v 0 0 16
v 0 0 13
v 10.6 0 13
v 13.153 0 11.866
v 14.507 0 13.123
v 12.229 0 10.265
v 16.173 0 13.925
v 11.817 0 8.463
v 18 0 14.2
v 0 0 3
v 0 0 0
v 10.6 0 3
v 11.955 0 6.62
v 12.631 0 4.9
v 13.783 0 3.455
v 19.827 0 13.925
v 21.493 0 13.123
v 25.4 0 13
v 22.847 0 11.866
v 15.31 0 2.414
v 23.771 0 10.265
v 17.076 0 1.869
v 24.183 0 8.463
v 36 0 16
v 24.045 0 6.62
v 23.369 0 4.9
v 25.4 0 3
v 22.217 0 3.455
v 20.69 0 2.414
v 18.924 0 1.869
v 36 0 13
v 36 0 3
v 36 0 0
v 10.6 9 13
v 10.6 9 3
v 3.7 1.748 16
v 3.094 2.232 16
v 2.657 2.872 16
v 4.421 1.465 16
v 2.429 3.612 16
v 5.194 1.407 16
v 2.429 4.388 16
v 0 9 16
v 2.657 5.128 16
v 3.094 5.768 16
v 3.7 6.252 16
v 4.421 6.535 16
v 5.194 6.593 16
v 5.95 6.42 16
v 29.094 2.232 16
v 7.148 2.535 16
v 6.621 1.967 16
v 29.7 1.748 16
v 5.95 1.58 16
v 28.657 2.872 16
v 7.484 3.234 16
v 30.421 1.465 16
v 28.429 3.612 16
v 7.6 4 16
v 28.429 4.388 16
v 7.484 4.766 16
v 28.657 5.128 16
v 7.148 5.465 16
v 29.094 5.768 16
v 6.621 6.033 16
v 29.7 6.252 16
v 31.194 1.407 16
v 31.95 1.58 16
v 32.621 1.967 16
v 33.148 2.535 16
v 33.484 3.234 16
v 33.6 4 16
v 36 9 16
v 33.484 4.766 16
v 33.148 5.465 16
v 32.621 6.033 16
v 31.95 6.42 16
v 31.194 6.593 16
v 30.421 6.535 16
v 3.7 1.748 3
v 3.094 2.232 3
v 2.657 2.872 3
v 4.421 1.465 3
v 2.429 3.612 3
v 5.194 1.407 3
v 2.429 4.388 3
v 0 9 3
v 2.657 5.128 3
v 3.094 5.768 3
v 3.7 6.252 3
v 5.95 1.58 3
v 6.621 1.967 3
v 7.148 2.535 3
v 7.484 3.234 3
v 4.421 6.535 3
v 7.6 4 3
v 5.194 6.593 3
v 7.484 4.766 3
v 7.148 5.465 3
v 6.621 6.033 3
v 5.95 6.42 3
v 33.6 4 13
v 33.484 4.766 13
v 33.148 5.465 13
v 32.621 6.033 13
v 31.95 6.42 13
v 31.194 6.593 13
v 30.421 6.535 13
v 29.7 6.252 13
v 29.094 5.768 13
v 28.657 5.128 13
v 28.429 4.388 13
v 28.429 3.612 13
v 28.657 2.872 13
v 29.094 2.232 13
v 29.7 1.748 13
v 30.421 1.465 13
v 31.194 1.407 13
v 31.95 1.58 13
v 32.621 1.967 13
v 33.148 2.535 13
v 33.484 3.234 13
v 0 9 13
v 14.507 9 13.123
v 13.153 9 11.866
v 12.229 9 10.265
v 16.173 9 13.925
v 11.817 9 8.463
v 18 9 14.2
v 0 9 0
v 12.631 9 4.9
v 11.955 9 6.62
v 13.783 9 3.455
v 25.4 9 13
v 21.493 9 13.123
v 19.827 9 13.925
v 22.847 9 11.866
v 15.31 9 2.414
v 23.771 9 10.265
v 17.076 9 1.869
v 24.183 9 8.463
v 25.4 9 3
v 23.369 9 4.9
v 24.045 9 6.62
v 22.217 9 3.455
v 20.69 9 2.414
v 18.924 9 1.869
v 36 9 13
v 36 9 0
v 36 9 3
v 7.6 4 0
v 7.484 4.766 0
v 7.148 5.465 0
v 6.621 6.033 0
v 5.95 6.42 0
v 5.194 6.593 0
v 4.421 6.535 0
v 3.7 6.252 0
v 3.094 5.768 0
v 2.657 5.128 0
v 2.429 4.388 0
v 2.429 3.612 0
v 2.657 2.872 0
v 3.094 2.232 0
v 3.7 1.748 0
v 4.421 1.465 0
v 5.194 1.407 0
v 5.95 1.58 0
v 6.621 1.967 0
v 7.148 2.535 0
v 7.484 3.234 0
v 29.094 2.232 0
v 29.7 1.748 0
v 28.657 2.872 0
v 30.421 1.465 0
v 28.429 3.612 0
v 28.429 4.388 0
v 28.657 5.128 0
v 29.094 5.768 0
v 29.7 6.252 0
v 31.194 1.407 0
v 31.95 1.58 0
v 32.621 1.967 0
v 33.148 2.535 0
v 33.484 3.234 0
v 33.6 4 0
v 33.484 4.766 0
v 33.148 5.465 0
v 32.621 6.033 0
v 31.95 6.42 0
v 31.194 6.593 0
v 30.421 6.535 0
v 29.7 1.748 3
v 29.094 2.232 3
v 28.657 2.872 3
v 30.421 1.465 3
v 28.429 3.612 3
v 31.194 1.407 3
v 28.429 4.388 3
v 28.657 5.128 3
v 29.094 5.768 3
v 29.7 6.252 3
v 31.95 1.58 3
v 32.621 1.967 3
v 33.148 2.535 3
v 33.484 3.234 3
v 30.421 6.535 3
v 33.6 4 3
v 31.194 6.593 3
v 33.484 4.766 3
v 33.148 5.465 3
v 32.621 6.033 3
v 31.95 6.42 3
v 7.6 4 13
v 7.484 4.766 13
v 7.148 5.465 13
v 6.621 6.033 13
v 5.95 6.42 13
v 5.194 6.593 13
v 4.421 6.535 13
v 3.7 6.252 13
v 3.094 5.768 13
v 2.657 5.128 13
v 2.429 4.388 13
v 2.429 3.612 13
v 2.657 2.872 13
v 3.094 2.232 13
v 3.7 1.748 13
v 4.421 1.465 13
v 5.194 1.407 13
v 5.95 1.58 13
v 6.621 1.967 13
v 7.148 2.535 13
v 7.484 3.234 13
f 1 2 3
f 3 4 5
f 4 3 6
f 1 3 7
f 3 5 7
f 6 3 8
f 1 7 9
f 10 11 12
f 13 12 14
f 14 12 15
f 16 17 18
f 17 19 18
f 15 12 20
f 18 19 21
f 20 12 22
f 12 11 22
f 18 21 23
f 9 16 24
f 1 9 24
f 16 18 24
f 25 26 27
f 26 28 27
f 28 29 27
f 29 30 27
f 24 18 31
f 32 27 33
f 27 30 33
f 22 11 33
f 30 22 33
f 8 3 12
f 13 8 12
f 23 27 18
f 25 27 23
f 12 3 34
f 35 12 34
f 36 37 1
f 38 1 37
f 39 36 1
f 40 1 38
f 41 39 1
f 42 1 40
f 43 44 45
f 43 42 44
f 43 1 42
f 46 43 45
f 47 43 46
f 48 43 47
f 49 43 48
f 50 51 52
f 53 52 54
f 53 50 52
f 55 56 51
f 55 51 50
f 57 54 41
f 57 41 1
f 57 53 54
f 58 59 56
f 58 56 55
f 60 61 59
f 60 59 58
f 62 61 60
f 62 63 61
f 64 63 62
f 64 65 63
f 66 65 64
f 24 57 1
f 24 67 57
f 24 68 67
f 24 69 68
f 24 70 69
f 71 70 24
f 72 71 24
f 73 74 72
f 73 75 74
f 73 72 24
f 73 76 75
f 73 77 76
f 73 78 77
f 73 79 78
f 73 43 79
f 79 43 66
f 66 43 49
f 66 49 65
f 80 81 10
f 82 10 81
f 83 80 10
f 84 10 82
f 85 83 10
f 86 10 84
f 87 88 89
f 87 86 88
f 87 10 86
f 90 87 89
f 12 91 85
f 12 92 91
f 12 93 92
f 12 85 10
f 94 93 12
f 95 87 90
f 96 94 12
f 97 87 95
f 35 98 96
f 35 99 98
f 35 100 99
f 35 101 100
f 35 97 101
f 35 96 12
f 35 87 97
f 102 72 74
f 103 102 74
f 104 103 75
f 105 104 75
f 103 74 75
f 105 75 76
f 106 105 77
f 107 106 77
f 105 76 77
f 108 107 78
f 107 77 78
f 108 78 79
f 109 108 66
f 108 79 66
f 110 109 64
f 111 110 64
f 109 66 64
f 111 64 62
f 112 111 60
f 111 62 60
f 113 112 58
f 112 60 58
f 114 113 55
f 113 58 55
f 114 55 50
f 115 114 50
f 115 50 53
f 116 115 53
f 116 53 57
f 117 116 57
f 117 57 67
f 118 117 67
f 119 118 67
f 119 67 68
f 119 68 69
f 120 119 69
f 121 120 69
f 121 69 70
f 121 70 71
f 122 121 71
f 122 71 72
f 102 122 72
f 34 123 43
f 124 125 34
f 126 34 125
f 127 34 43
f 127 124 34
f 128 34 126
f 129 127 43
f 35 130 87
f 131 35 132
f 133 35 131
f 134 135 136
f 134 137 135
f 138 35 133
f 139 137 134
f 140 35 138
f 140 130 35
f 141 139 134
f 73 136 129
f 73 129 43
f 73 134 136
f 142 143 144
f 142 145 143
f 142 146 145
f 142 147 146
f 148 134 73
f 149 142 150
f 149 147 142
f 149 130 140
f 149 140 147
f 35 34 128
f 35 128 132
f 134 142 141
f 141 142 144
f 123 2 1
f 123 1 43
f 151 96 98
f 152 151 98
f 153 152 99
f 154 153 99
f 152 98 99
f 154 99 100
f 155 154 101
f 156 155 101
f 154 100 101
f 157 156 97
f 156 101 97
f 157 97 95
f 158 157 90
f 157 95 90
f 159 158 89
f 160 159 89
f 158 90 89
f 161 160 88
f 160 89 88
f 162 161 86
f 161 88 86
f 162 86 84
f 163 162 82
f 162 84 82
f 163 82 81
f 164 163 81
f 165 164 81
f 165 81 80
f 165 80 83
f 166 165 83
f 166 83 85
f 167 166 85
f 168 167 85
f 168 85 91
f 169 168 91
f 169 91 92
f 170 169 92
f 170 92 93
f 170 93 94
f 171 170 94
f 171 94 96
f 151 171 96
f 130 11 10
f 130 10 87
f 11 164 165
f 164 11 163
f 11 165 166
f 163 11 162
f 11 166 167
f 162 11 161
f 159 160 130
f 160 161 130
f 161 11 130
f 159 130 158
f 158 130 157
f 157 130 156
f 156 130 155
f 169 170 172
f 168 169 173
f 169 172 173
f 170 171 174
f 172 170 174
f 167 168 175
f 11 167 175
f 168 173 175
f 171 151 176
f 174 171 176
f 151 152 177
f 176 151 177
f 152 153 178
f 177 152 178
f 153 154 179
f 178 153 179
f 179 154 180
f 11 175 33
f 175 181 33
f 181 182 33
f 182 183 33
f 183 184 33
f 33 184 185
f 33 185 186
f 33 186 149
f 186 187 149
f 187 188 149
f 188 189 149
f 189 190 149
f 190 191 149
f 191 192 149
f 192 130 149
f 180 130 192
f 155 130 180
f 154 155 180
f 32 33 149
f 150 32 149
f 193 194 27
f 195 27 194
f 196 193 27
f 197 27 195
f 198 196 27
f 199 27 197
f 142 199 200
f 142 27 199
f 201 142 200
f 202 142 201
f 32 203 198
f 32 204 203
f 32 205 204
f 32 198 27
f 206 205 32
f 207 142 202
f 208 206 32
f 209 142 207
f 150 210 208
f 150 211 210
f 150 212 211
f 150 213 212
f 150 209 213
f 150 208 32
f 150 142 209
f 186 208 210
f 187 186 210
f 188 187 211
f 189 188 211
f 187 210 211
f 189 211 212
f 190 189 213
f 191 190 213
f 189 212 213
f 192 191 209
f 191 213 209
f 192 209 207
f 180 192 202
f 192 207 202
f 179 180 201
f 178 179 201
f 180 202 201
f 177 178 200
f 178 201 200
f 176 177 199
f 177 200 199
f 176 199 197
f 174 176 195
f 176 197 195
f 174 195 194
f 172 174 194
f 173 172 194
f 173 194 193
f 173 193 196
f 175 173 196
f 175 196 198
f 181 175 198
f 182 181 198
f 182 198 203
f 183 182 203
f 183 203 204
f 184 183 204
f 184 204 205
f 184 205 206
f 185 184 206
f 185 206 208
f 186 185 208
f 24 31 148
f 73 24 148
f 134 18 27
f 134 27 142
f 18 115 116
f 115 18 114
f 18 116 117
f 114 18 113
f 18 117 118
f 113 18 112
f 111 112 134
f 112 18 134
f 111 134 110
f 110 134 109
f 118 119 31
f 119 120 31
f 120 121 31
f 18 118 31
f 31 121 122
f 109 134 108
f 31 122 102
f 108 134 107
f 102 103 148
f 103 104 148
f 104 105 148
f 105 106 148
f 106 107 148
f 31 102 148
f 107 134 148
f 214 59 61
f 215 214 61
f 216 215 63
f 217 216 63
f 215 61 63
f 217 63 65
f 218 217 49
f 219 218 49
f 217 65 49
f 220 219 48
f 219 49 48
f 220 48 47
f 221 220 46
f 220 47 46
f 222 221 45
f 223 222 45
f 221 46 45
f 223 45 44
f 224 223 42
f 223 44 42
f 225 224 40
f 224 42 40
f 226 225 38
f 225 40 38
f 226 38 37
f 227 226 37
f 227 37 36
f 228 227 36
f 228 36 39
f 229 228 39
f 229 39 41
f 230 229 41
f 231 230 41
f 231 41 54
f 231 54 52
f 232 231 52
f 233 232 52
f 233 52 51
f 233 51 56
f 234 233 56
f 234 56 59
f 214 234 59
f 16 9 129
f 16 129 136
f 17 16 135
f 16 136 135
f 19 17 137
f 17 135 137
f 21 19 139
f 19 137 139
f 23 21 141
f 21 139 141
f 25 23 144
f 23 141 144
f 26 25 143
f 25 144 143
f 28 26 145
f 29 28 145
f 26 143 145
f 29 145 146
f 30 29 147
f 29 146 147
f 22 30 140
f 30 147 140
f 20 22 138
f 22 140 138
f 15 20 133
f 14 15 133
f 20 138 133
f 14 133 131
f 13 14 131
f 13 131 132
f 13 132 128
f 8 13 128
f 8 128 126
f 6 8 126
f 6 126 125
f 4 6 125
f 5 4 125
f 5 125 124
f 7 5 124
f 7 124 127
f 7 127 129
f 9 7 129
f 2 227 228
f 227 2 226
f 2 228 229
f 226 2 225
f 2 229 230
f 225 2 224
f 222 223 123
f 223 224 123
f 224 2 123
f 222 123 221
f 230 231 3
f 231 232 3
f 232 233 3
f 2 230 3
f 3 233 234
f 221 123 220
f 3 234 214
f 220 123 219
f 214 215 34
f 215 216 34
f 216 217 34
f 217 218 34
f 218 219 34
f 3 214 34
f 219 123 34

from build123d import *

# Parameters (mm, degrees)
SKETCH_1_W              = 36
SKETCH_1_H              = 9
BLOCKEXTRUDE_DEPTH      = 16
SKETCH_3_W              = 12.6
SKETCH_3_H              = 13
CLEVIS_SLOT_DEPTH       = 5
SKETCH_4_W              = 12.6
SKETCH_4_H              = 13
CUT_EXTRUDE_2_DEPTH     = 5
SKETCH_5_R              = 2.6
PIVOT_BORE_DEPTH        = 41.410394702
SKETCH_6_R              = 2.6
CUT_EXTRUDE_4_DEPTH     = 41.410394702
SKETCH_7_R              = 6.2
SPINDLE_CLEARANCE_DEPTH = 41.410394702


with BuildPart() as part:
    # 草图1 → BlockExtrude (new body)
    with BuildSketch(Plane.XY):
        with Locations((18, 4.5)):
            Rectangle(SKETCH_1_W, SKETCH_1_H)
    extrude(amount=BLOCKEXTRUDE_DEPTH)

    # 草图3 → Clevis_slot (cut, symmetric)
    with BuildSketch(Plane.XY.offset(8)):
        with Locations((4.3, 4.5)):
            Rectangle(SKETCH_3_W, SKETCH_3_H)
    extrude(amount=CLEVIS_SLOT_DEPTH, both=True, mode=Mode.SUBTRACT)

    # 草图4 → 切除-拉伸2 (cut, symmetric)
    with BuildSketch(Plane.XY.offset(8)):
        with Locations((31.7, 4.5)):
            Rectangle(SKETCH_4_W, SKETCH_4_H)
    extrude(amount=CUT_EXTRUDE_2_DEPTH, both=True, mode=Mode.SUBTRACT)

    # 草图5 → Pivot_bore (cut, through all)
    with BuildSketch(Plane.XY.offset(16)):
        with Locations((5, 4)):
            Circle(SKETCH_5_R)
    extrude(amount=-PIVOT_BORE_DEPTH, mode=Mode.SUBTRACT)

    # 草图6 → 切除-拉伸4 (cut, through all)
    with BuildSketch(Plane.XY.offset(16)):
        with Locations((31, 4)):
            Circle(SKETCH_6_R)
    extrude(amount=-CUT_EXTRUDE_4_DEPTH, mode=Mode.SUBTRACT)

    # 草图7 → Spindle_clearance (cut, through all)
    with BuildSketch(Plane(origin=(0, 9, 0), x_dir=(1, 0, 0), z_dir=(0, 1, 0))):
        with Locations(Location((18, -8, 0), (0, 0, 270))):
            Circle(SKETCH_7_R)
    extrude(amount=-SPINDLE_CLEARANCE_DEPTH, mode=Mode.SUBTRACT)


solid = part.part
